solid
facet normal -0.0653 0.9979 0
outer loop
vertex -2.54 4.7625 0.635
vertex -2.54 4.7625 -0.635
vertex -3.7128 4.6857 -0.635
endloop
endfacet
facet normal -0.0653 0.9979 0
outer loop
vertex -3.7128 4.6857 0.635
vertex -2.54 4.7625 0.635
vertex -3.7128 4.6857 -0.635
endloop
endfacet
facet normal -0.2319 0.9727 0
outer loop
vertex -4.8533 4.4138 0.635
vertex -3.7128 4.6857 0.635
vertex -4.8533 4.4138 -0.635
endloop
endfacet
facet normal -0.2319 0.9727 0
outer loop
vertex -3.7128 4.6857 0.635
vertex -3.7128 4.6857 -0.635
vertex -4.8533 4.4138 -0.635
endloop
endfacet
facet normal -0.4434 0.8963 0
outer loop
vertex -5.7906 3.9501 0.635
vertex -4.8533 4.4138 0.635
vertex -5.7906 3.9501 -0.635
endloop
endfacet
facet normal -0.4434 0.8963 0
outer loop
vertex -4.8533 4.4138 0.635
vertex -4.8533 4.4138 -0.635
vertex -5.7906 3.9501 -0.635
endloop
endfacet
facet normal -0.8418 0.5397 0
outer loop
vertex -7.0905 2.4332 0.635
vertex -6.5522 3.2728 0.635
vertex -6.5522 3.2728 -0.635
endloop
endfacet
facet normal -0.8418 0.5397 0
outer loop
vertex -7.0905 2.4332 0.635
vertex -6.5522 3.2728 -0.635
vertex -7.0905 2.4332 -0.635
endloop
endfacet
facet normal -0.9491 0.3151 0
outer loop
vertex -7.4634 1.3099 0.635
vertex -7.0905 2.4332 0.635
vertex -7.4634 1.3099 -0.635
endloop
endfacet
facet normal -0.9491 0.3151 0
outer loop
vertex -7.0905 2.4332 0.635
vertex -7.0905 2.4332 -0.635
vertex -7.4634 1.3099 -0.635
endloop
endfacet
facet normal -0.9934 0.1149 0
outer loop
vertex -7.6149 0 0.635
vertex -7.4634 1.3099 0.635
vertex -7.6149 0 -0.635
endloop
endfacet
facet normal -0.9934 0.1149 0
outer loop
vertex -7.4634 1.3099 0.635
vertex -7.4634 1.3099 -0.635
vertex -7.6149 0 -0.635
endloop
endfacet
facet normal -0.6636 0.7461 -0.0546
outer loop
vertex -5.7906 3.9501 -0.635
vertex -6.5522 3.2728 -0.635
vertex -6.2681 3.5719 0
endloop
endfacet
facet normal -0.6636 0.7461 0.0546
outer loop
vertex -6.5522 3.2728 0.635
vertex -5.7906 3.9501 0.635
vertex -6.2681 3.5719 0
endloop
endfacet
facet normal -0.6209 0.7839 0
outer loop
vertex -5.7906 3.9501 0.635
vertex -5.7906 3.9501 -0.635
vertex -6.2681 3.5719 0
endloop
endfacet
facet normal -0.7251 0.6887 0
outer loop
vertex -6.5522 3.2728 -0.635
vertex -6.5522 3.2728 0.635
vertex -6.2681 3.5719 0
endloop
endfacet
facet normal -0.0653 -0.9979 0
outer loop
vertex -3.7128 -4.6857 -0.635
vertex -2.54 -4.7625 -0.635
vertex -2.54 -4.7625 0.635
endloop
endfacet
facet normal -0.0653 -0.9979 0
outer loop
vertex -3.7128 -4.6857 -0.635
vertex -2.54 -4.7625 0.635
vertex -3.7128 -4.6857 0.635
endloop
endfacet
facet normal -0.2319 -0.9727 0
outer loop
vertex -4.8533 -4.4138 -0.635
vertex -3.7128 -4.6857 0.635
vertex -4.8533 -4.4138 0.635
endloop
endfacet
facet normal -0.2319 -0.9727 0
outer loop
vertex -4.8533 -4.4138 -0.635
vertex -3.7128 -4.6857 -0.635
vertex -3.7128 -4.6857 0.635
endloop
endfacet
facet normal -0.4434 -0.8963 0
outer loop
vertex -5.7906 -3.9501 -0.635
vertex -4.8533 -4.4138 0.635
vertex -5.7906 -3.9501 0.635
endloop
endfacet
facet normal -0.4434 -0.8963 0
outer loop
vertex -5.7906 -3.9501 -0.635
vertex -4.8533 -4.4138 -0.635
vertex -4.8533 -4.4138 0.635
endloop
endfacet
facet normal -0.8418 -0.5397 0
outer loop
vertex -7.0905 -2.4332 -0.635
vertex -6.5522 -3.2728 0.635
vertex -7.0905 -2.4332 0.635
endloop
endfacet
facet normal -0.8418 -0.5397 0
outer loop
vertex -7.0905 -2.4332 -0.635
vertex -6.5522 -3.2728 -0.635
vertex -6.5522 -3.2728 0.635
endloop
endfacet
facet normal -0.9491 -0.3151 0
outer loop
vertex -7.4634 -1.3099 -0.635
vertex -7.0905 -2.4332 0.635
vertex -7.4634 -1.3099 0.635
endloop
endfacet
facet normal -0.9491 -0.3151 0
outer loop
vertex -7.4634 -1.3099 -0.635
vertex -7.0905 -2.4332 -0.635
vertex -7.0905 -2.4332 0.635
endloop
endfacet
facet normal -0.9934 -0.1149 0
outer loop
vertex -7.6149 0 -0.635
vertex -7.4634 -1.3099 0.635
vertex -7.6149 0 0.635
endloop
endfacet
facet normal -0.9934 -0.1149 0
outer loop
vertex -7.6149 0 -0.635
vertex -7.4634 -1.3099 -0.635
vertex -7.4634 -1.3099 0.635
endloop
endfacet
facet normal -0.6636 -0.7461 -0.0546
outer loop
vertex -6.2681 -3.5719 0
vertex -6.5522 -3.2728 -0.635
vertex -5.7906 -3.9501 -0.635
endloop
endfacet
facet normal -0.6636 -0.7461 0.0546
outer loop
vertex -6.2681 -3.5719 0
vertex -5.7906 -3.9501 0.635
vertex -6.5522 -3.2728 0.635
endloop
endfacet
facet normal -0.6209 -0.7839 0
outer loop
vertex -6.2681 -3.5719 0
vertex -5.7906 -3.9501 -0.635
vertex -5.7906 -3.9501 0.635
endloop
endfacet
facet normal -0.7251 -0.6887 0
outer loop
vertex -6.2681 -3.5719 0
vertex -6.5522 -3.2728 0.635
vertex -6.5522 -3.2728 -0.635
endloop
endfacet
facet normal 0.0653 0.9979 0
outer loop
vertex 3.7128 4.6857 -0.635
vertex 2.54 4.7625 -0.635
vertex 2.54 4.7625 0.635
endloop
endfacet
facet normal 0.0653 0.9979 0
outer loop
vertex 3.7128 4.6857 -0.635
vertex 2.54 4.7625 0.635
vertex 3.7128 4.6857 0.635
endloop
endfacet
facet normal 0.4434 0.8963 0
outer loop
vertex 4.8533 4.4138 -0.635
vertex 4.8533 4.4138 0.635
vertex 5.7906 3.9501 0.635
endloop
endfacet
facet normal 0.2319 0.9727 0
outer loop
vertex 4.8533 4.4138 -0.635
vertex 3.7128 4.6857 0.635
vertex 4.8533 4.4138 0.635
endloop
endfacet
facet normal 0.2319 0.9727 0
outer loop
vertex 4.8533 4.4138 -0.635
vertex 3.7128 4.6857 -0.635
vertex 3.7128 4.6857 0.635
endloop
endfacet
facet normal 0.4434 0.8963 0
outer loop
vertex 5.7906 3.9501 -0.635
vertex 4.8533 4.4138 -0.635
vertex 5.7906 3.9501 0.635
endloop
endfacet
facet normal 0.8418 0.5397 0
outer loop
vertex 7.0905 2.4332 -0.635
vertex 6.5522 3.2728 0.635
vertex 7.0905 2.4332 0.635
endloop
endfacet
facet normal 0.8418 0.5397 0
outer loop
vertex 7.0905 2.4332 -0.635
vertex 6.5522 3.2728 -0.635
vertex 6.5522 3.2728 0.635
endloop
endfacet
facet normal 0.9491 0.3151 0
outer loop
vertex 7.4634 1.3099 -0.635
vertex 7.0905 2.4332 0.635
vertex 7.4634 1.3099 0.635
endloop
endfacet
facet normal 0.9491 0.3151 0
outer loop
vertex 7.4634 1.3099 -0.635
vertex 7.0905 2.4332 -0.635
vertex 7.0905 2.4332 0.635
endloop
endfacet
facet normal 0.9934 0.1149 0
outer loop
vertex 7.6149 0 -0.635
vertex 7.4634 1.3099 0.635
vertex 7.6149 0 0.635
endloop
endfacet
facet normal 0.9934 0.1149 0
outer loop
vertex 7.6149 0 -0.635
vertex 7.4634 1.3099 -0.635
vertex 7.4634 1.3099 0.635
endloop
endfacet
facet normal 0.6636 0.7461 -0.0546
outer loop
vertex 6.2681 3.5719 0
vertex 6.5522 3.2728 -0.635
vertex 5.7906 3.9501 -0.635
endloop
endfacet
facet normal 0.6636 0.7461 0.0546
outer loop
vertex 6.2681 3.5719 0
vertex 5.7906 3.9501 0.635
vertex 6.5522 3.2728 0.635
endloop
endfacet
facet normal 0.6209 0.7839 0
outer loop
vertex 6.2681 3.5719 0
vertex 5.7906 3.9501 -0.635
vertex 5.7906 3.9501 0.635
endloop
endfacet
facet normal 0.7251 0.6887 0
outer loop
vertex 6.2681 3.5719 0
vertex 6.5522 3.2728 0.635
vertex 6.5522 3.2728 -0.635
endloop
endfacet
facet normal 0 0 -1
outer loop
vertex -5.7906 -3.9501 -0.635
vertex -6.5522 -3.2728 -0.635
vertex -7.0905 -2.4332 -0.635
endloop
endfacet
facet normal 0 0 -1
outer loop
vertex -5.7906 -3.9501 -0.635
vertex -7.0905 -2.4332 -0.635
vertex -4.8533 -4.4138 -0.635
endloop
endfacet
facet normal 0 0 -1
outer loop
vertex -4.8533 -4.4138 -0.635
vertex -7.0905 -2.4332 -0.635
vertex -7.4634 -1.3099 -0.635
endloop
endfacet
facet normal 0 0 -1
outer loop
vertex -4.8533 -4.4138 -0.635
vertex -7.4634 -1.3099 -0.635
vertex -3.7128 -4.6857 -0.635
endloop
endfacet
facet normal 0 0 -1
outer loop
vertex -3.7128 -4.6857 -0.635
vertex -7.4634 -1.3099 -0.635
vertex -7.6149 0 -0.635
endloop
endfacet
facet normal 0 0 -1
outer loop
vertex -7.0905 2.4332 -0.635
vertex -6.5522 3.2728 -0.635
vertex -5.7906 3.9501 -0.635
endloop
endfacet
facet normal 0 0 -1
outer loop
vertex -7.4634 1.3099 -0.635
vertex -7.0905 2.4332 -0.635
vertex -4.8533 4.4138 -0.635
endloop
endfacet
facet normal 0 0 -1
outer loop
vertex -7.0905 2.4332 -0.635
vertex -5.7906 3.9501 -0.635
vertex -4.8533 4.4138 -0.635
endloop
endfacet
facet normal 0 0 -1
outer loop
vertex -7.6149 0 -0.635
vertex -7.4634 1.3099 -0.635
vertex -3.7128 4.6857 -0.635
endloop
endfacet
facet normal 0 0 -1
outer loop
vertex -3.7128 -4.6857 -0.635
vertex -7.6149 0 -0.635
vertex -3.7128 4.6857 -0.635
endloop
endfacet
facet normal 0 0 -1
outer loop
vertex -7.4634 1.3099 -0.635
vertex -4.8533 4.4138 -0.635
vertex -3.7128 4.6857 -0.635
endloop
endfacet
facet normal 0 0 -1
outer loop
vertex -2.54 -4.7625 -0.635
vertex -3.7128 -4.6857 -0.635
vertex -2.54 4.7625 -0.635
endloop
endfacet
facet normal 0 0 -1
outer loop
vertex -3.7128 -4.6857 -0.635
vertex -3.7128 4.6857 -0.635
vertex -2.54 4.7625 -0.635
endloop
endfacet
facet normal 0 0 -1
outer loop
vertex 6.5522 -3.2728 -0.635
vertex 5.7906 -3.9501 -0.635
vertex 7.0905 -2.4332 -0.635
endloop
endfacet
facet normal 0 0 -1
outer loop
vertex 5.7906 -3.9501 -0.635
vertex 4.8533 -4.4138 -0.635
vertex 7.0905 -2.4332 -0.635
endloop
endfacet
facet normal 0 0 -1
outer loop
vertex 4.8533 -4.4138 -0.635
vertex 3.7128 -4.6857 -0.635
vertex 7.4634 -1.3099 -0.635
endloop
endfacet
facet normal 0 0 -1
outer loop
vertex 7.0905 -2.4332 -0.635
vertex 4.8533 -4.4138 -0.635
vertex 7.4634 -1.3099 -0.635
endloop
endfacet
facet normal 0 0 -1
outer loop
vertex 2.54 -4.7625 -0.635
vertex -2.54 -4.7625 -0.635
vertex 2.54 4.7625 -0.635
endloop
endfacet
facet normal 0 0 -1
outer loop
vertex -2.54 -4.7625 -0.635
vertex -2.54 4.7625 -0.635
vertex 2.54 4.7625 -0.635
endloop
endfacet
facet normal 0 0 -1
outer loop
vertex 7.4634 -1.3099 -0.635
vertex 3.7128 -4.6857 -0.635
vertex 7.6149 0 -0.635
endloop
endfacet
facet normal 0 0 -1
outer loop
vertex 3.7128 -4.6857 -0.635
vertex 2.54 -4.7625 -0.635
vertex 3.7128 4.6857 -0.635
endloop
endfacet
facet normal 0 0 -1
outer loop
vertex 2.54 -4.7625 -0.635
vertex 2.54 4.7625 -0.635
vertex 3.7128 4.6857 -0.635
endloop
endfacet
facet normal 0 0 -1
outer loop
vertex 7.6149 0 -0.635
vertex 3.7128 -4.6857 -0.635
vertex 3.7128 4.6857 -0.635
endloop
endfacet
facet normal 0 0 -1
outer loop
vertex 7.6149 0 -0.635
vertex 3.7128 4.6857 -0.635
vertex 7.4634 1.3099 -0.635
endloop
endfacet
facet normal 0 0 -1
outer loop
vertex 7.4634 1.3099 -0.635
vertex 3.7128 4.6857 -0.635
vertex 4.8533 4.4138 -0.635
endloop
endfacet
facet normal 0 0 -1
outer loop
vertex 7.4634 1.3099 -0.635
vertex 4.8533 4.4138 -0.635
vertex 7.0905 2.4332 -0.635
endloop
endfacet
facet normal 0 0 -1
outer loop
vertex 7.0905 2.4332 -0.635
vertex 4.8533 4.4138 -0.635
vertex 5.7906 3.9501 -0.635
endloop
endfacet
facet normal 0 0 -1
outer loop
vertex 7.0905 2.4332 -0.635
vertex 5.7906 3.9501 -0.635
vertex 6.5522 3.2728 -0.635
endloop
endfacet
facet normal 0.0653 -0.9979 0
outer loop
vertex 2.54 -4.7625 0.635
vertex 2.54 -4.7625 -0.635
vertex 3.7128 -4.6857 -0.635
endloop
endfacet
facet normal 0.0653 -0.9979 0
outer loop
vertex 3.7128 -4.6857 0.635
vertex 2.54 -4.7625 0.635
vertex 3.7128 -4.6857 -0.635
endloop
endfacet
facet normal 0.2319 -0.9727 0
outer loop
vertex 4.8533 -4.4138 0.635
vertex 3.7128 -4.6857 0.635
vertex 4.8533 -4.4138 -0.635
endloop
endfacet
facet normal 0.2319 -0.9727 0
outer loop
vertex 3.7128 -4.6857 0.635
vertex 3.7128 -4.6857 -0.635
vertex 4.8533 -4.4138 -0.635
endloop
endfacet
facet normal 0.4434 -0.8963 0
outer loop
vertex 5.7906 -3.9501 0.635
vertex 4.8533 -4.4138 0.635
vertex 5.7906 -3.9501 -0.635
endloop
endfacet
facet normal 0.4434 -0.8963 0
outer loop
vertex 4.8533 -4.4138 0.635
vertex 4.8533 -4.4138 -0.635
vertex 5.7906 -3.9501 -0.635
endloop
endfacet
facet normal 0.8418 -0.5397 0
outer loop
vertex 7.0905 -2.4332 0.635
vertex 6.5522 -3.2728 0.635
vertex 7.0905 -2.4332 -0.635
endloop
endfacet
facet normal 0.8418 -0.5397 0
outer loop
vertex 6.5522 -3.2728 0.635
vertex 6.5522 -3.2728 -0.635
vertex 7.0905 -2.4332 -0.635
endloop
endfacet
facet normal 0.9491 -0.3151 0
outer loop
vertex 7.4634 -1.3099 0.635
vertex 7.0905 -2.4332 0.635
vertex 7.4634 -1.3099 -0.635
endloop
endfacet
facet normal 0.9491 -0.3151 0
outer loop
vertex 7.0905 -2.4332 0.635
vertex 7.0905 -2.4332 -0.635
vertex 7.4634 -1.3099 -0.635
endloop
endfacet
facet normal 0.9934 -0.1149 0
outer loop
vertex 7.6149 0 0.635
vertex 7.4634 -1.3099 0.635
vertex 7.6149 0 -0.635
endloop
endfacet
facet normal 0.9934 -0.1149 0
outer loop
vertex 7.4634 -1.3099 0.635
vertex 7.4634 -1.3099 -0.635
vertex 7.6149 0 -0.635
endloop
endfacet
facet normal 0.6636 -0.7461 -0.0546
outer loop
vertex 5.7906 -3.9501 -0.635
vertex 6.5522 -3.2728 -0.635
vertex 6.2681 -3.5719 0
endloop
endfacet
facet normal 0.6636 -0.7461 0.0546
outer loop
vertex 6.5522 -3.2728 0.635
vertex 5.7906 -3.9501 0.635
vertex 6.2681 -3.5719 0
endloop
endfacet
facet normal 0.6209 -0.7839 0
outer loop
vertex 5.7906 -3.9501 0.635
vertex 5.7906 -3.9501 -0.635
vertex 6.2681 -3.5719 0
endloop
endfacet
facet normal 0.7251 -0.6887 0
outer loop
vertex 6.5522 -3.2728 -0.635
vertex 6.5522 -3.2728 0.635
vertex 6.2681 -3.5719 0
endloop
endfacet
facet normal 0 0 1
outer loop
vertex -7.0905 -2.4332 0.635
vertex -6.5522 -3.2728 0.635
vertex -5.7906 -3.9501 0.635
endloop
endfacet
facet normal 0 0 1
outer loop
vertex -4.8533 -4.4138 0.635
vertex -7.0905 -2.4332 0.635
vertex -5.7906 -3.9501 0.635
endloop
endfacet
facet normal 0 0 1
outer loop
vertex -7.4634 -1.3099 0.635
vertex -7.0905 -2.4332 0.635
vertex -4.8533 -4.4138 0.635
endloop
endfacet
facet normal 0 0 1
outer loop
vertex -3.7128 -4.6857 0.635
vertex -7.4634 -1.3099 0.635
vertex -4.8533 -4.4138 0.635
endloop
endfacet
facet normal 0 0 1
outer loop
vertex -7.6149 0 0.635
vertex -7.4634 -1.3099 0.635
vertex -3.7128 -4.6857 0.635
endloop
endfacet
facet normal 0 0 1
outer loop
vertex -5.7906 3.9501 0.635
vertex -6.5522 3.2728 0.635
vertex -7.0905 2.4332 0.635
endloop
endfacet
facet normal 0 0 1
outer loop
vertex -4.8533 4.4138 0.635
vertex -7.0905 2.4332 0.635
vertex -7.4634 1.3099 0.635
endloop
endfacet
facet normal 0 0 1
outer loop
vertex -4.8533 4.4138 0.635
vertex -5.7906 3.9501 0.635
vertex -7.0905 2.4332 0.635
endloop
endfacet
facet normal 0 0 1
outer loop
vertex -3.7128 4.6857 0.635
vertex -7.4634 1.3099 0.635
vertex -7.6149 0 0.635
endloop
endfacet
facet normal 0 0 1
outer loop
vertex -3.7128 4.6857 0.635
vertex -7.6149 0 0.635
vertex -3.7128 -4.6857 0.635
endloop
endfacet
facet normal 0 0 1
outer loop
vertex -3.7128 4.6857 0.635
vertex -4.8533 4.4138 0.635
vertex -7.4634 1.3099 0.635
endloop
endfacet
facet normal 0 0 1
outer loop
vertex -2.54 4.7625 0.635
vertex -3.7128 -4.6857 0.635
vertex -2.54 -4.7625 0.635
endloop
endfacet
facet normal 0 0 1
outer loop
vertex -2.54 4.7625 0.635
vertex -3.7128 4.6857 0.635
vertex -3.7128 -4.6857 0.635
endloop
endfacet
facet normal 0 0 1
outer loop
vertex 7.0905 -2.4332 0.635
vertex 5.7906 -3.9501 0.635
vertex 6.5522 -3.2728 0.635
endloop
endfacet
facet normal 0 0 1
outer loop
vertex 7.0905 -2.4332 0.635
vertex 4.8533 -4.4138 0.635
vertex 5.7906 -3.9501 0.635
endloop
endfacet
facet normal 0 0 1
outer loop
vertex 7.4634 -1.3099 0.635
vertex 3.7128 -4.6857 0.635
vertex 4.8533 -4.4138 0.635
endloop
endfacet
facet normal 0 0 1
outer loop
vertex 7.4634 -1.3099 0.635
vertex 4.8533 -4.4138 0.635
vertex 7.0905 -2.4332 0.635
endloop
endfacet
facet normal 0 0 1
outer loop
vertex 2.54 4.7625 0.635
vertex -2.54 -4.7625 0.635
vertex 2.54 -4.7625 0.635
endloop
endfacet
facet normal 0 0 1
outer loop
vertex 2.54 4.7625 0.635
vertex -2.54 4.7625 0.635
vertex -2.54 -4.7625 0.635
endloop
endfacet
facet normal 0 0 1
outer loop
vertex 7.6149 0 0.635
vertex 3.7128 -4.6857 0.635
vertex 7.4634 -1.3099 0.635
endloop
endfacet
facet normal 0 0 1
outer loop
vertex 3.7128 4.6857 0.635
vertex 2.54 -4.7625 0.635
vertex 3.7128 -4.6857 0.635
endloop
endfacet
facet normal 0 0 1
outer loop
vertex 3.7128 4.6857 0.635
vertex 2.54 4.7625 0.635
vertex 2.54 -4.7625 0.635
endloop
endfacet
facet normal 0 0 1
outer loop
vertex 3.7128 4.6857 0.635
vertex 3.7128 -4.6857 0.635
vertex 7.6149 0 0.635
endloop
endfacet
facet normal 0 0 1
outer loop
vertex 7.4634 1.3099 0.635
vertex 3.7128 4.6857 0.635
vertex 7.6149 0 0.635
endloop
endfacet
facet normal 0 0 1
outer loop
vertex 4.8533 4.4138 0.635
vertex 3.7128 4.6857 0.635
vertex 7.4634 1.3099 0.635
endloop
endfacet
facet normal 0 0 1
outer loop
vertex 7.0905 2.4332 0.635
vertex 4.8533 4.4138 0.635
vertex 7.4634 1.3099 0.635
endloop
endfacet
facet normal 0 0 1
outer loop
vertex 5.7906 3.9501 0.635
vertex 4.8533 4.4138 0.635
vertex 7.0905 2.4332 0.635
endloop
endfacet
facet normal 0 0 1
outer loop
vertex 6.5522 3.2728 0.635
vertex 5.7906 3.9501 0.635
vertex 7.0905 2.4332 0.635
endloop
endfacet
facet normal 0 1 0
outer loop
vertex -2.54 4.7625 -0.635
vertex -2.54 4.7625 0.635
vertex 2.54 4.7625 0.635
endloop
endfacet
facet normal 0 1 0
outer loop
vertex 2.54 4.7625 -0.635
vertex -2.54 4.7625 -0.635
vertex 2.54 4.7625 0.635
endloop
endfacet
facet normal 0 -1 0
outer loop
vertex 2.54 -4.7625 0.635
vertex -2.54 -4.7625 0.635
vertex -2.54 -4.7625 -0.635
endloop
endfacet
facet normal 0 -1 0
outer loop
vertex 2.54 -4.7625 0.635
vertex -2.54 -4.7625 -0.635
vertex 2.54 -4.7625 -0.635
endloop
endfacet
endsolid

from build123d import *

# Parameters (mm, degrees)
F0_W          = 15.24
F0_H          = 9.525
F1_DEPTH      = 0.635
F1_DEPTH_BACK = 0.635
F2_T1_DEPTH   = 26.67


# Not quite as in the source:
# - a fillet or chamfer that OpenCascade refuses, or shapes differently, is made with other operations: its cross-section is extruded or revolved along the edge and cut away or added


with BuildPart() as f1:
    # F0 (on Top) → F1 (new body, two sides)
    with BuildSketch(Plane.XY) as f1_sk:
        Rectangle(F0_W, F0_H)
    extrude(amount=F1_DEPTH)
    extrude(f1_sk.sketch, amount=-F1_DEPTH_BACK)

    # F2: fillet of radius 5.08 on 4 edges, made by hand

    # F2_s2 → F2_t1 (cut)
    with BuildSketch(Plane.XY.offset(-13.335)):
        with BuildLine():
            add(Edge.make_bspline(
                [(-2.54, -4.7625), (-7.62, -4.7625), (-7.62, 0.3175)],
                knots=[0, 0, 0, 1, 1, 1], degree=2, weights=[1, 1, 1]))
            Line((-7.62, 0.3175), (-7.62, -4.7625))
            Line((-7.62, -4.7625), (-2.54, -4.7625))
        make_face()
        with BuildLine():
            add(Edge.make_bspline(
                [(2.54, -4.7625), (7.62, -4.7625), (7.62, 0.3175)],
                knots=[0, 0, 0, 1, 1, 1], degree=2, weights=[1, 1, 1]))
            Line((7.62, 0.3175), (7.62, -4.7625))
            Line((7.62, -4.7625), (2.54, -4.7625))
        make_face()
        with BuildLine():
            add(Edge.make_bspline(
                [(2.54, 4.7625), (7.62, 4.7625), (7.62, -0.3175)],
                knots=[0, 0, 0, 1, 1, 1], degree=2, weights=[1, 1, 1]))
            Line((7.62, -0.3175), (7.62, 4.7625))
            Line((7.62, 4.7625), (2.54, 4.7625))
        make_face()
        with BuildLine():
            add(Edge.make_bspline(
                [(-2.54, 4.7625), (-7.62, 4.7625), (-7.62, -0.3175)],
                knots=[0, 0, 0, 1, 1, 1], degree=2, weights=[1, 1, 1]))
            Line((-7.62, -0.3175), (-7.62, 4.7625))
            Line((-7.62, 4.7625), (-2.54, 4.7625))
        make_face()
    extrude(amount=F2_T1_DEPTH, mode=Mode.SUBTRACT)


solid = f1.part
